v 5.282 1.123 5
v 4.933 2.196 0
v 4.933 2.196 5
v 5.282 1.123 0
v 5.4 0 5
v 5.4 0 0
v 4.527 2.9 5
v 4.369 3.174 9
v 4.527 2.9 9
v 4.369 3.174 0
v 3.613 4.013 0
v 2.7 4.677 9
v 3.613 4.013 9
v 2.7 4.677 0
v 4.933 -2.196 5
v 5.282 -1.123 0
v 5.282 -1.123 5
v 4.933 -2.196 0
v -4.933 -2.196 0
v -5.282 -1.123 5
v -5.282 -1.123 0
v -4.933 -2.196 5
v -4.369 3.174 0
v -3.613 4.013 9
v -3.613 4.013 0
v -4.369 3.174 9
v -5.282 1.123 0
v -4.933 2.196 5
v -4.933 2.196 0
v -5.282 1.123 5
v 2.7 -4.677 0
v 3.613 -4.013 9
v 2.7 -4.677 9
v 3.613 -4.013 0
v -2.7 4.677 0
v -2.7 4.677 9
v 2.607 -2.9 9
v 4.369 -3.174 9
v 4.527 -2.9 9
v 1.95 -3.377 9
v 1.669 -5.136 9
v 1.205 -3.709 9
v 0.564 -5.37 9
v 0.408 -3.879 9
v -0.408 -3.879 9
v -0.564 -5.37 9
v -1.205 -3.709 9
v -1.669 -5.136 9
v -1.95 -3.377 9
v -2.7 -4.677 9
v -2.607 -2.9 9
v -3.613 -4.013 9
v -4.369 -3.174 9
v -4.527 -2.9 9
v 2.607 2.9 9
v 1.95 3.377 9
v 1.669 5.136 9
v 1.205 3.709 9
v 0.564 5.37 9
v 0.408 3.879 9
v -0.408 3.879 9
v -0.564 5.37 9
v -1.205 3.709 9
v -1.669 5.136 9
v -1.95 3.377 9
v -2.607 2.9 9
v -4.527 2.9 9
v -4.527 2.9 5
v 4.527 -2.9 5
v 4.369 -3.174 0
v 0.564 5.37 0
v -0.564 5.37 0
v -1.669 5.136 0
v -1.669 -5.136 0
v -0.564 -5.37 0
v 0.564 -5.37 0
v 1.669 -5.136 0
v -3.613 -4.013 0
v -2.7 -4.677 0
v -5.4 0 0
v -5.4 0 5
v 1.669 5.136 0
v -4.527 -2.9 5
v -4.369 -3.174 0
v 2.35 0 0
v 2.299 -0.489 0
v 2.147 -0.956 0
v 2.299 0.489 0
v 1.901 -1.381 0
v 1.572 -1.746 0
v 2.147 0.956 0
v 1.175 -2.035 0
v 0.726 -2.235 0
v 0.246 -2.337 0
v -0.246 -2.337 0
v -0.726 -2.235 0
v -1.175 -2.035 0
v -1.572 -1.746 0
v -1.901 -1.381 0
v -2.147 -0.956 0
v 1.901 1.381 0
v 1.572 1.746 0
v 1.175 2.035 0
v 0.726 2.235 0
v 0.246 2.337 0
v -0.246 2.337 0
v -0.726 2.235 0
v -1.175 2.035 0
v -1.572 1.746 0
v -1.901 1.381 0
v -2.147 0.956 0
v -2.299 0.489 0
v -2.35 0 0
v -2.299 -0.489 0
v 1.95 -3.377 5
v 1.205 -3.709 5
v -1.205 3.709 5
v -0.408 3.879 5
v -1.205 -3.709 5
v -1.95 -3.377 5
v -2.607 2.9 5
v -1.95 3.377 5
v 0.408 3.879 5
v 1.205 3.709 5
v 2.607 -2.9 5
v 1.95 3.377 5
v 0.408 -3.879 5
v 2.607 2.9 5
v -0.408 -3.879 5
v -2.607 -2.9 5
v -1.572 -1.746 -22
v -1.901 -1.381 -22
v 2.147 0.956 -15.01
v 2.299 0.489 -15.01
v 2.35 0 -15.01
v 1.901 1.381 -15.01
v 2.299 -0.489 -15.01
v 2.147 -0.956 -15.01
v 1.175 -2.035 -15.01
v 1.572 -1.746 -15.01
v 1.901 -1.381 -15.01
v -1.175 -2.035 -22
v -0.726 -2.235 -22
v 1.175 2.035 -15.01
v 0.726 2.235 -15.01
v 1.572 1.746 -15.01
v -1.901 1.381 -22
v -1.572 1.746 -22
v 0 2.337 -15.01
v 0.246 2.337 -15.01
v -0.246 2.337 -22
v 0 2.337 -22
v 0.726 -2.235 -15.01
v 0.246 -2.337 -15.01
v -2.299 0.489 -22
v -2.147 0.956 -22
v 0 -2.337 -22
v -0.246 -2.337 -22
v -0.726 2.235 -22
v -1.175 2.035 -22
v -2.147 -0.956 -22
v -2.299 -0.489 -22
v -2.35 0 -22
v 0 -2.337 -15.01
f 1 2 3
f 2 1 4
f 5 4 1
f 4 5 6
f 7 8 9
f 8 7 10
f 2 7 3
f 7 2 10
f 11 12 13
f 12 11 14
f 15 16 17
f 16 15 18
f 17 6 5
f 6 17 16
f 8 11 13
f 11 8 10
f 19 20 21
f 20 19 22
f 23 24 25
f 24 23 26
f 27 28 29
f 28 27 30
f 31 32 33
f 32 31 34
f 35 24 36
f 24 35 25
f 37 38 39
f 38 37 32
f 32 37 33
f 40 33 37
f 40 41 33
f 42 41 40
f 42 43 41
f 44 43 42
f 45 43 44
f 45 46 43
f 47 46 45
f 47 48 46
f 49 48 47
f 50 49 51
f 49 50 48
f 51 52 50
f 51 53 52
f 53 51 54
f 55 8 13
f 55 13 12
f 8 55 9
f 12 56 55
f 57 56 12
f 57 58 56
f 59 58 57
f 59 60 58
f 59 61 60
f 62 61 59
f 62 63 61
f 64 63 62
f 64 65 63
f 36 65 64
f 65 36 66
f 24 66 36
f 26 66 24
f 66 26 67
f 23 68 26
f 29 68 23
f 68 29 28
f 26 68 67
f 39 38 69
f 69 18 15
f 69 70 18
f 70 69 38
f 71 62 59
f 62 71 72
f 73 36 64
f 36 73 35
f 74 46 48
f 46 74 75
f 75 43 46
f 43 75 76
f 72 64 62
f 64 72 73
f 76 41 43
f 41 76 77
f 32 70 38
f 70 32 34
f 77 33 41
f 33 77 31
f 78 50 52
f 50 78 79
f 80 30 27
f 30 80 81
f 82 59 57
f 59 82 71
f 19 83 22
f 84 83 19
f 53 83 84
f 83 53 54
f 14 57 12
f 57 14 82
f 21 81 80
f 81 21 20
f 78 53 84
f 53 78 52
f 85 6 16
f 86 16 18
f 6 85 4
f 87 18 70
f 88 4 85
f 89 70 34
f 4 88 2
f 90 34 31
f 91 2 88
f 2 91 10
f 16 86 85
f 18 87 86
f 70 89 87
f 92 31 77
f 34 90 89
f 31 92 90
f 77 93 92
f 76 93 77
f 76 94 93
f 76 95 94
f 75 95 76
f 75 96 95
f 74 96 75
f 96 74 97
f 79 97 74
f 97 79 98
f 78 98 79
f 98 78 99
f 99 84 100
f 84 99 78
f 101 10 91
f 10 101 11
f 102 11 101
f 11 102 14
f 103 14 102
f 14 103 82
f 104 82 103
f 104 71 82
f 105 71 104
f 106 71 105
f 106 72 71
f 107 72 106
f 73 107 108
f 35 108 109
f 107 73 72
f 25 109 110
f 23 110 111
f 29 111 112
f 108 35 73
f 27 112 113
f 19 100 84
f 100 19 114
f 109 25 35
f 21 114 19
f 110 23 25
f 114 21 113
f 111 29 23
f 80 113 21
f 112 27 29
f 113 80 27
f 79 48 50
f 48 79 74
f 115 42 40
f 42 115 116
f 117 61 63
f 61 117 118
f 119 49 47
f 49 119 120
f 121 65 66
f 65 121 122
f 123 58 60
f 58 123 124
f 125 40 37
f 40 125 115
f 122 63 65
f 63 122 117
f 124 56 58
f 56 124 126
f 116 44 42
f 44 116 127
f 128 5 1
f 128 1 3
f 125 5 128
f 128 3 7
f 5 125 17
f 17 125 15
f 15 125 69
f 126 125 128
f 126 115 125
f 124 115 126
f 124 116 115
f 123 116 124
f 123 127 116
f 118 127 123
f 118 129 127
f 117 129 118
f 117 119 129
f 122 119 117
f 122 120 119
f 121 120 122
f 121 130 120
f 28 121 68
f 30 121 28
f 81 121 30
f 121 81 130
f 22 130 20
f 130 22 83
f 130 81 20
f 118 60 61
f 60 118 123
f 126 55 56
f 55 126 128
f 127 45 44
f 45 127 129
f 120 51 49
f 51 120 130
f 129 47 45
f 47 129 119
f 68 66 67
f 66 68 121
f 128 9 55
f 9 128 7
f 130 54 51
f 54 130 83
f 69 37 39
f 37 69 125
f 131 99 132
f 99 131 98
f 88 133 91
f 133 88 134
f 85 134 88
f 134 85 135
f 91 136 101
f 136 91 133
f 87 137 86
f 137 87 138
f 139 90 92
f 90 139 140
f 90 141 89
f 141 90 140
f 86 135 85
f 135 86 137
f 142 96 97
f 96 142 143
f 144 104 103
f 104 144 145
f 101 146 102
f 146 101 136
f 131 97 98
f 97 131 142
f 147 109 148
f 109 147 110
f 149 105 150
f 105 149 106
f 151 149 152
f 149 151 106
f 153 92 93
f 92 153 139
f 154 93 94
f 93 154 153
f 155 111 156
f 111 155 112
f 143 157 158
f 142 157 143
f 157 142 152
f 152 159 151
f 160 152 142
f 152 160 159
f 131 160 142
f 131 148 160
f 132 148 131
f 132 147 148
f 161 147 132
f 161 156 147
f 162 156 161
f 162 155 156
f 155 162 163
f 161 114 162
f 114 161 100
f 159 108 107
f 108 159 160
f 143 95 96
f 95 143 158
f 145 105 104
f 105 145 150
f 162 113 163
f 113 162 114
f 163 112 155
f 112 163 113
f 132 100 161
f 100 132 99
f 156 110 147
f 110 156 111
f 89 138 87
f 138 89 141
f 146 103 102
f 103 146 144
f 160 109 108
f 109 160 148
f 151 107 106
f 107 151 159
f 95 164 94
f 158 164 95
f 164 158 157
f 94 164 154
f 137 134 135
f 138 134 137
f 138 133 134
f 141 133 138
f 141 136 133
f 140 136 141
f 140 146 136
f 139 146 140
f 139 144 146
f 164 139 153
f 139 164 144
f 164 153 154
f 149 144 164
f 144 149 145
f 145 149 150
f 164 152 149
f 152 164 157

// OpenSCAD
$fn=30;

prong_dia = 4.7;
prong_length = 22;
prong_cut_length = 7.01;

servo_arm_dia = 7.8;


wall_thickness = 1.5;
component_dia = servo_arm_dia + 2*wall_thickness;
component_depth = 9;

cutaway_block_size = 5.8;
cutaway_depth = 4;

difference(){
    cylinder(d=component_dia,component_depth);

  
    translate([0,0,cutaway_depth+1]){
        cylinder(d=servo_arm_dia, 10);
    }
    translate([0,0,cutaway_depth + 1 +
               (component_depth-cutaway_depth)/2]){
    cube([
          20,
          cutaway_block_size,
          component_depth-cutaway_depth
         ],
        center=true);
}
}


difference(){
    translate([0,0,-prong_length])
    cylinder(d=prong_dia, prong_length);
    
    translate([10/2,0,-prong_length+7/2-.01])
    cube([10,10, 7], center = true);

   
}
